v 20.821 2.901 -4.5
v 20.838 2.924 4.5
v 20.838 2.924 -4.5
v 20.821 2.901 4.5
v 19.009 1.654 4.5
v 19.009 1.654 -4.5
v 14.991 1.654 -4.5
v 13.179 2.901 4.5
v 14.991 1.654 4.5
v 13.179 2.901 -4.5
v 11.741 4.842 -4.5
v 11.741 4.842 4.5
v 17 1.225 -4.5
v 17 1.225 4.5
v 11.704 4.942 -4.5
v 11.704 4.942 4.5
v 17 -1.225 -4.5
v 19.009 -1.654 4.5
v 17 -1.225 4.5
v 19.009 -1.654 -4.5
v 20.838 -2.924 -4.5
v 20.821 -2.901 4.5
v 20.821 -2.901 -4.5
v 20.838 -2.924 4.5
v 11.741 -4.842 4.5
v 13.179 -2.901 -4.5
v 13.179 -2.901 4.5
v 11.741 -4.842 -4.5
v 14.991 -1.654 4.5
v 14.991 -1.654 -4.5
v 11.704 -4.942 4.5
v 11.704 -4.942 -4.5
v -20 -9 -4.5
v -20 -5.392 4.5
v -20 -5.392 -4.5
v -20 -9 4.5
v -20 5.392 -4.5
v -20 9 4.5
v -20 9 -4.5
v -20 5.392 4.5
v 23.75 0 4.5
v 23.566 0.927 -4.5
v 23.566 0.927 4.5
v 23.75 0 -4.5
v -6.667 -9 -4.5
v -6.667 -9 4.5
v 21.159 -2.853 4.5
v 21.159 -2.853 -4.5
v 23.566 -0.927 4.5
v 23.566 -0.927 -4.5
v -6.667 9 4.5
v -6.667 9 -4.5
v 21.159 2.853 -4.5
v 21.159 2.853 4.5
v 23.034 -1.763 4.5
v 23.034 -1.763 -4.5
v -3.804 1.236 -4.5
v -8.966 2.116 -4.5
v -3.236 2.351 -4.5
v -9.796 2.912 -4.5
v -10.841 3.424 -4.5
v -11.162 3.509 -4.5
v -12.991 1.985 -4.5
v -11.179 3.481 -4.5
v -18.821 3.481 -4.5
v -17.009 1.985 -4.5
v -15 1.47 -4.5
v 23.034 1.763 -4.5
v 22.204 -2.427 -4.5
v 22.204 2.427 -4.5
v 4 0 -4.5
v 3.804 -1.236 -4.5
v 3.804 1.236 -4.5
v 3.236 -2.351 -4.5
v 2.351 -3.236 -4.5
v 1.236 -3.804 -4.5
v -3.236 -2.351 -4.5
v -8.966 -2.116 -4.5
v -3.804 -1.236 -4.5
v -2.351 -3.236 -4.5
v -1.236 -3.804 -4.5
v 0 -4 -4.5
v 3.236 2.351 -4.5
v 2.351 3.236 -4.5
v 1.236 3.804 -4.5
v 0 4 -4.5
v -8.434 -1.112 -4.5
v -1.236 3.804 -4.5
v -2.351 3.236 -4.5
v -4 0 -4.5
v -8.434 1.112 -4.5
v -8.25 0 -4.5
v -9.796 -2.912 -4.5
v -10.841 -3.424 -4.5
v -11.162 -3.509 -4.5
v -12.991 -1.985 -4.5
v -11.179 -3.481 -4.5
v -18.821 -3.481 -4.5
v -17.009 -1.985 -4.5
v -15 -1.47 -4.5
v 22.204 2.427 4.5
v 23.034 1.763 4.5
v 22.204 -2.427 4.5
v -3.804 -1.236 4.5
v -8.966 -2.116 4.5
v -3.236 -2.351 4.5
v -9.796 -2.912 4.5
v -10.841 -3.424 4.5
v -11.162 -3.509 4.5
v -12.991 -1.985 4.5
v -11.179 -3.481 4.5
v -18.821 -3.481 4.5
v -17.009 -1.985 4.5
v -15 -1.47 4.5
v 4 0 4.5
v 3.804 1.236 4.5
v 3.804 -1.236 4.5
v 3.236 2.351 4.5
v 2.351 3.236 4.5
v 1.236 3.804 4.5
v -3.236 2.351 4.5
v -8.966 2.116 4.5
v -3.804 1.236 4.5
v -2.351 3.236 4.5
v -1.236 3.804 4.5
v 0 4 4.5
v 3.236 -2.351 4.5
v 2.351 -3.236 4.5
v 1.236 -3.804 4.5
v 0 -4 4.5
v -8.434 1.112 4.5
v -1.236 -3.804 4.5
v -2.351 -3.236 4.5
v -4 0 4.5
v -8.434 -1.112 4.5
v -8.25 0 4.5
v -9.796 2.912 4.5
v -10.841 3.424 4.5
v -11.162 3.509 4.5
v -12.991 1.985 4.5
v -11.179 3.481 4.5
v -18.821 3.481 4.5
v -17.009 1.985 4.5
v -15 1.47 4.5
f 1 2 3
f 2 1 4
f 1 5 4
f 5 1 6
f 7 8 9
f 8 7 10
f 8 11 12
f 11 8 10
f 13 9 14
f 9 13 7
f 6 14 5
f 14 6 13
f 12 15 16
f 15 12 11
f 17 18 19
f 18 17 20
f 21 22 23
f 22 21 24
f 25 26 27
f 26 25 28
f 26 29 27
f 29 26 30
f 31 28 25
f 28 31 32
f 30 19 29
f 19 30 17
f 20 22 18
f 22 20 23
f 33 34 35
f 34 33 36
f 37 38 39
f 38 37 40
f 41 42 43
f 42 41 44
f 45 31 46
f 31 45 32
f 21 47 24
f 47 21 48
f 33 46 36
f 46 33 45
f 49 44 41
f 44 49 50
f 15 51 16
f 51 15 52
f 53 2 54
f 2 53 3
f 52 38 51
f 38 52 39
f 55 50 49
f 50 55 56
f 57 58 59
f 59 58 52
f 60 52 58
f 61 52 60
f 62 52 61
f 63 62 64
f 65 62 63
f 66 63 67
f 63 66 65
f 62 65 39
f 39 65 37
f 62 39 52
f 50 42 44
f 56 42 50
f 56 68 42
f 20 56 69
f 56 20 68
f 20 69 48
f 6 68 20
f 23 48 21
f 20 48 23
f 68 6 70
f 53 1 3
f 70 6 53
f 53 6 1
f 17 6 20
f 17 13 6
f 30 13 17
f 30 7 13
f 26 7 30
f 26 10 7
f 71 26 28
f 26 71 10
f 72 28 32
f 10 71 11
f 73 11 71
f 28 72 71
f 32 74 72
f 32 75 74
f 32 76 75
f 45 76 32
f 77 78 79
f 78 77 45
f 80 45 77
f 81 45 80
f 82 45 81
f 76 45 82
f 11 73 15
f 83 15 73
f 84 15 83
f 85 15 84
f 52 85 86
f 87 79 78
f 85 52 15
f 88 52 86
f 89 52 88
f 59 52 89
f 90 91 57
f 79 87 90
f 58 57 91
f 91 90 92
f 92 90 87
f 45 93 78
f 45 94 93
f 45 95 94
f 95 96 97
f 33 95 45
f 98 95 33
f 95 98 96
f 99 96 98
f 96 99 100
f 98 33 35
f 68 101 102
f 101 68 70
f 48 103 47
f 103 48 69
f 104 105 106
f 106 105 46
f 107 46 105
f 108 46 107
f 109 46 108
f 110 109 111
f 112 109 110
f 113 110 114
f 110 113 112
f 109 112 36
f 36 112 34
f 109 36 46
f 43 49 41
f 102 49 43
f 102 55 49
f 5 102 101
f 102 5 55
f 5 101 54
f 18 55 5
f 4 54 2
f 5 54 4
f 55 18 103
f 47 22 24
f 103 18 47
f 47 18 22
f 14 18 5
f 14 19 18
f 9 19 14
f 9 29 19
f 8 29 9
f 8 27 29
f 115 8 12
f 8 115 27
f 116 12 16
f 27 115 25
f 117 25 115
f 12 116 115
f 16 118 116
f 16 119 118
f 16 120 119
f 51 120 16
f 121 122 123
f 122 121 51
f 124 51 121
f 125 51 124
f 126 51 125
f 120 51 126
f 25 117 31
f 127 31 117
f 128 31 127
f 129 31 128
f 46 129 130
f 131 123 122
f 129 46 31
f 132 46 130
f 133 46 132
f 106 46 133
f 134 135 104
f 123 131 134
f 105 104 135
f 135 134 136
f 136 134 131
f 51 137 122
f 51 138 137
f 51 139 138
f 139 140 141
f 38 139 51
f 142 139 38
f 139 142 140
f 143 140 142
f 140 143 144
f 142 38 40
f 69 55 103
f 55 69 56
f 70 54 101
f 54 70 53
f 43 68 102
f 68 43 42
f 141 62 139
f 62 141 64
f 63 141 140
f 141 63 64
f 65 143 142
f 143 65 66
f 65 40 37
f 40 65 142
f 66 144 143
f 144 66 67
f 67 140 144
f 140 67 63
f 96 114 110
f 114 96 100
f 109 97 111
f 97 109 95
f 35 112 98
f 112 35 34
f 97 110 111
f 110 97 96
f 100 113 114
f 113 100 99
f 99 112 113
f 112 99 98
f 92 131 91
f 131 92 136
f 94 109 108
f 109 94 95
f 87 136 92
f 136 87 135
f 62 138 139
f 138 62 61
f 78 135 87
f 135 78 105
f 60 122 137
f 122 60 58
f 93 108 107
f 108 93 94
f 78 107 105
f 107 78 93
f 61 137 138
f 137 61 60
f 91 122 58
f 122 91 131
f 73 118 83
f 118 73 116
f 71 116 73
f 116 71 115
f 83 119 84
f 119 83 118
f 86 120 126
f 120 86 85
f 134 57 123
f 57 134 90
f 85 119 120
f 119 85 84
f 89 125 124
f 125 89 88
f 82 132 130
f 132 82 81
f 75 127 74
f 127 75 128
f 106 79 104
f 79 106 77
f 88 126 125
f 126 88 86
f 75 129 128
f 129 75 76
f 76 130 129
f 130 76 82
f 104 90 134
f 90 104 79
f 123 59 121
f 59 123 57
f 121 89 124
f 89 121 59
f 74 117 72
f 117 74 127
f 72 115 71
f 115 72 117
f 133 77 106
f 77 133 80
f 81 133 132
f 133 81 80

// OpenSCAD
/*
// dgazineu@gmail.com (Douglas Gazineu)
// Rev1: 2016-08-25 :: Initial Release
//
*/

/* [General Options] */
Length=40;//[35:55]
Height=9;
Width=18; //[14:30]
Hanging_Hole=1; //[0:No,1:Yes]
Hanging_Hole_Diameter=8;

module spacer(){
    $fn=20;   
    difference(){
        fitting(Height);
        union(){
            if (Hanging_Hole ==1 ) cylinder( h = 2*Height, d = Hanging_Hole_Diameter, center=true);
            translate([-Length+8,0,0]) scale([1,1.2,1]) difference(){
                fitting(2*Height);
            }
        }
    }
}

module fitting(Height){
    $fn=20;
    difference(){
        hull(){
            translate([-Length/2, -Width/2, -Height/2]) cube([Length/3, Width, Height]);
            translate([Length/2, 0, 0]) scale([1.25,1,1]) cylinder( h = Height, d = 6, center=true);
        }
        union(){
            translate([Length/2-3, Width/2+(10-Width/2), 0]) scale([1,1.35,1])cylinder( h = 2*Height, d = 13, center=true);
            translate([Length/2-3, -Width/2-(10-Width/2), 0]) scale([1,1.35,1])cylinder( h = 2*Height, d = 13, center=true);
        }
    } 
}
module view(){
   spacer();
}

view();
